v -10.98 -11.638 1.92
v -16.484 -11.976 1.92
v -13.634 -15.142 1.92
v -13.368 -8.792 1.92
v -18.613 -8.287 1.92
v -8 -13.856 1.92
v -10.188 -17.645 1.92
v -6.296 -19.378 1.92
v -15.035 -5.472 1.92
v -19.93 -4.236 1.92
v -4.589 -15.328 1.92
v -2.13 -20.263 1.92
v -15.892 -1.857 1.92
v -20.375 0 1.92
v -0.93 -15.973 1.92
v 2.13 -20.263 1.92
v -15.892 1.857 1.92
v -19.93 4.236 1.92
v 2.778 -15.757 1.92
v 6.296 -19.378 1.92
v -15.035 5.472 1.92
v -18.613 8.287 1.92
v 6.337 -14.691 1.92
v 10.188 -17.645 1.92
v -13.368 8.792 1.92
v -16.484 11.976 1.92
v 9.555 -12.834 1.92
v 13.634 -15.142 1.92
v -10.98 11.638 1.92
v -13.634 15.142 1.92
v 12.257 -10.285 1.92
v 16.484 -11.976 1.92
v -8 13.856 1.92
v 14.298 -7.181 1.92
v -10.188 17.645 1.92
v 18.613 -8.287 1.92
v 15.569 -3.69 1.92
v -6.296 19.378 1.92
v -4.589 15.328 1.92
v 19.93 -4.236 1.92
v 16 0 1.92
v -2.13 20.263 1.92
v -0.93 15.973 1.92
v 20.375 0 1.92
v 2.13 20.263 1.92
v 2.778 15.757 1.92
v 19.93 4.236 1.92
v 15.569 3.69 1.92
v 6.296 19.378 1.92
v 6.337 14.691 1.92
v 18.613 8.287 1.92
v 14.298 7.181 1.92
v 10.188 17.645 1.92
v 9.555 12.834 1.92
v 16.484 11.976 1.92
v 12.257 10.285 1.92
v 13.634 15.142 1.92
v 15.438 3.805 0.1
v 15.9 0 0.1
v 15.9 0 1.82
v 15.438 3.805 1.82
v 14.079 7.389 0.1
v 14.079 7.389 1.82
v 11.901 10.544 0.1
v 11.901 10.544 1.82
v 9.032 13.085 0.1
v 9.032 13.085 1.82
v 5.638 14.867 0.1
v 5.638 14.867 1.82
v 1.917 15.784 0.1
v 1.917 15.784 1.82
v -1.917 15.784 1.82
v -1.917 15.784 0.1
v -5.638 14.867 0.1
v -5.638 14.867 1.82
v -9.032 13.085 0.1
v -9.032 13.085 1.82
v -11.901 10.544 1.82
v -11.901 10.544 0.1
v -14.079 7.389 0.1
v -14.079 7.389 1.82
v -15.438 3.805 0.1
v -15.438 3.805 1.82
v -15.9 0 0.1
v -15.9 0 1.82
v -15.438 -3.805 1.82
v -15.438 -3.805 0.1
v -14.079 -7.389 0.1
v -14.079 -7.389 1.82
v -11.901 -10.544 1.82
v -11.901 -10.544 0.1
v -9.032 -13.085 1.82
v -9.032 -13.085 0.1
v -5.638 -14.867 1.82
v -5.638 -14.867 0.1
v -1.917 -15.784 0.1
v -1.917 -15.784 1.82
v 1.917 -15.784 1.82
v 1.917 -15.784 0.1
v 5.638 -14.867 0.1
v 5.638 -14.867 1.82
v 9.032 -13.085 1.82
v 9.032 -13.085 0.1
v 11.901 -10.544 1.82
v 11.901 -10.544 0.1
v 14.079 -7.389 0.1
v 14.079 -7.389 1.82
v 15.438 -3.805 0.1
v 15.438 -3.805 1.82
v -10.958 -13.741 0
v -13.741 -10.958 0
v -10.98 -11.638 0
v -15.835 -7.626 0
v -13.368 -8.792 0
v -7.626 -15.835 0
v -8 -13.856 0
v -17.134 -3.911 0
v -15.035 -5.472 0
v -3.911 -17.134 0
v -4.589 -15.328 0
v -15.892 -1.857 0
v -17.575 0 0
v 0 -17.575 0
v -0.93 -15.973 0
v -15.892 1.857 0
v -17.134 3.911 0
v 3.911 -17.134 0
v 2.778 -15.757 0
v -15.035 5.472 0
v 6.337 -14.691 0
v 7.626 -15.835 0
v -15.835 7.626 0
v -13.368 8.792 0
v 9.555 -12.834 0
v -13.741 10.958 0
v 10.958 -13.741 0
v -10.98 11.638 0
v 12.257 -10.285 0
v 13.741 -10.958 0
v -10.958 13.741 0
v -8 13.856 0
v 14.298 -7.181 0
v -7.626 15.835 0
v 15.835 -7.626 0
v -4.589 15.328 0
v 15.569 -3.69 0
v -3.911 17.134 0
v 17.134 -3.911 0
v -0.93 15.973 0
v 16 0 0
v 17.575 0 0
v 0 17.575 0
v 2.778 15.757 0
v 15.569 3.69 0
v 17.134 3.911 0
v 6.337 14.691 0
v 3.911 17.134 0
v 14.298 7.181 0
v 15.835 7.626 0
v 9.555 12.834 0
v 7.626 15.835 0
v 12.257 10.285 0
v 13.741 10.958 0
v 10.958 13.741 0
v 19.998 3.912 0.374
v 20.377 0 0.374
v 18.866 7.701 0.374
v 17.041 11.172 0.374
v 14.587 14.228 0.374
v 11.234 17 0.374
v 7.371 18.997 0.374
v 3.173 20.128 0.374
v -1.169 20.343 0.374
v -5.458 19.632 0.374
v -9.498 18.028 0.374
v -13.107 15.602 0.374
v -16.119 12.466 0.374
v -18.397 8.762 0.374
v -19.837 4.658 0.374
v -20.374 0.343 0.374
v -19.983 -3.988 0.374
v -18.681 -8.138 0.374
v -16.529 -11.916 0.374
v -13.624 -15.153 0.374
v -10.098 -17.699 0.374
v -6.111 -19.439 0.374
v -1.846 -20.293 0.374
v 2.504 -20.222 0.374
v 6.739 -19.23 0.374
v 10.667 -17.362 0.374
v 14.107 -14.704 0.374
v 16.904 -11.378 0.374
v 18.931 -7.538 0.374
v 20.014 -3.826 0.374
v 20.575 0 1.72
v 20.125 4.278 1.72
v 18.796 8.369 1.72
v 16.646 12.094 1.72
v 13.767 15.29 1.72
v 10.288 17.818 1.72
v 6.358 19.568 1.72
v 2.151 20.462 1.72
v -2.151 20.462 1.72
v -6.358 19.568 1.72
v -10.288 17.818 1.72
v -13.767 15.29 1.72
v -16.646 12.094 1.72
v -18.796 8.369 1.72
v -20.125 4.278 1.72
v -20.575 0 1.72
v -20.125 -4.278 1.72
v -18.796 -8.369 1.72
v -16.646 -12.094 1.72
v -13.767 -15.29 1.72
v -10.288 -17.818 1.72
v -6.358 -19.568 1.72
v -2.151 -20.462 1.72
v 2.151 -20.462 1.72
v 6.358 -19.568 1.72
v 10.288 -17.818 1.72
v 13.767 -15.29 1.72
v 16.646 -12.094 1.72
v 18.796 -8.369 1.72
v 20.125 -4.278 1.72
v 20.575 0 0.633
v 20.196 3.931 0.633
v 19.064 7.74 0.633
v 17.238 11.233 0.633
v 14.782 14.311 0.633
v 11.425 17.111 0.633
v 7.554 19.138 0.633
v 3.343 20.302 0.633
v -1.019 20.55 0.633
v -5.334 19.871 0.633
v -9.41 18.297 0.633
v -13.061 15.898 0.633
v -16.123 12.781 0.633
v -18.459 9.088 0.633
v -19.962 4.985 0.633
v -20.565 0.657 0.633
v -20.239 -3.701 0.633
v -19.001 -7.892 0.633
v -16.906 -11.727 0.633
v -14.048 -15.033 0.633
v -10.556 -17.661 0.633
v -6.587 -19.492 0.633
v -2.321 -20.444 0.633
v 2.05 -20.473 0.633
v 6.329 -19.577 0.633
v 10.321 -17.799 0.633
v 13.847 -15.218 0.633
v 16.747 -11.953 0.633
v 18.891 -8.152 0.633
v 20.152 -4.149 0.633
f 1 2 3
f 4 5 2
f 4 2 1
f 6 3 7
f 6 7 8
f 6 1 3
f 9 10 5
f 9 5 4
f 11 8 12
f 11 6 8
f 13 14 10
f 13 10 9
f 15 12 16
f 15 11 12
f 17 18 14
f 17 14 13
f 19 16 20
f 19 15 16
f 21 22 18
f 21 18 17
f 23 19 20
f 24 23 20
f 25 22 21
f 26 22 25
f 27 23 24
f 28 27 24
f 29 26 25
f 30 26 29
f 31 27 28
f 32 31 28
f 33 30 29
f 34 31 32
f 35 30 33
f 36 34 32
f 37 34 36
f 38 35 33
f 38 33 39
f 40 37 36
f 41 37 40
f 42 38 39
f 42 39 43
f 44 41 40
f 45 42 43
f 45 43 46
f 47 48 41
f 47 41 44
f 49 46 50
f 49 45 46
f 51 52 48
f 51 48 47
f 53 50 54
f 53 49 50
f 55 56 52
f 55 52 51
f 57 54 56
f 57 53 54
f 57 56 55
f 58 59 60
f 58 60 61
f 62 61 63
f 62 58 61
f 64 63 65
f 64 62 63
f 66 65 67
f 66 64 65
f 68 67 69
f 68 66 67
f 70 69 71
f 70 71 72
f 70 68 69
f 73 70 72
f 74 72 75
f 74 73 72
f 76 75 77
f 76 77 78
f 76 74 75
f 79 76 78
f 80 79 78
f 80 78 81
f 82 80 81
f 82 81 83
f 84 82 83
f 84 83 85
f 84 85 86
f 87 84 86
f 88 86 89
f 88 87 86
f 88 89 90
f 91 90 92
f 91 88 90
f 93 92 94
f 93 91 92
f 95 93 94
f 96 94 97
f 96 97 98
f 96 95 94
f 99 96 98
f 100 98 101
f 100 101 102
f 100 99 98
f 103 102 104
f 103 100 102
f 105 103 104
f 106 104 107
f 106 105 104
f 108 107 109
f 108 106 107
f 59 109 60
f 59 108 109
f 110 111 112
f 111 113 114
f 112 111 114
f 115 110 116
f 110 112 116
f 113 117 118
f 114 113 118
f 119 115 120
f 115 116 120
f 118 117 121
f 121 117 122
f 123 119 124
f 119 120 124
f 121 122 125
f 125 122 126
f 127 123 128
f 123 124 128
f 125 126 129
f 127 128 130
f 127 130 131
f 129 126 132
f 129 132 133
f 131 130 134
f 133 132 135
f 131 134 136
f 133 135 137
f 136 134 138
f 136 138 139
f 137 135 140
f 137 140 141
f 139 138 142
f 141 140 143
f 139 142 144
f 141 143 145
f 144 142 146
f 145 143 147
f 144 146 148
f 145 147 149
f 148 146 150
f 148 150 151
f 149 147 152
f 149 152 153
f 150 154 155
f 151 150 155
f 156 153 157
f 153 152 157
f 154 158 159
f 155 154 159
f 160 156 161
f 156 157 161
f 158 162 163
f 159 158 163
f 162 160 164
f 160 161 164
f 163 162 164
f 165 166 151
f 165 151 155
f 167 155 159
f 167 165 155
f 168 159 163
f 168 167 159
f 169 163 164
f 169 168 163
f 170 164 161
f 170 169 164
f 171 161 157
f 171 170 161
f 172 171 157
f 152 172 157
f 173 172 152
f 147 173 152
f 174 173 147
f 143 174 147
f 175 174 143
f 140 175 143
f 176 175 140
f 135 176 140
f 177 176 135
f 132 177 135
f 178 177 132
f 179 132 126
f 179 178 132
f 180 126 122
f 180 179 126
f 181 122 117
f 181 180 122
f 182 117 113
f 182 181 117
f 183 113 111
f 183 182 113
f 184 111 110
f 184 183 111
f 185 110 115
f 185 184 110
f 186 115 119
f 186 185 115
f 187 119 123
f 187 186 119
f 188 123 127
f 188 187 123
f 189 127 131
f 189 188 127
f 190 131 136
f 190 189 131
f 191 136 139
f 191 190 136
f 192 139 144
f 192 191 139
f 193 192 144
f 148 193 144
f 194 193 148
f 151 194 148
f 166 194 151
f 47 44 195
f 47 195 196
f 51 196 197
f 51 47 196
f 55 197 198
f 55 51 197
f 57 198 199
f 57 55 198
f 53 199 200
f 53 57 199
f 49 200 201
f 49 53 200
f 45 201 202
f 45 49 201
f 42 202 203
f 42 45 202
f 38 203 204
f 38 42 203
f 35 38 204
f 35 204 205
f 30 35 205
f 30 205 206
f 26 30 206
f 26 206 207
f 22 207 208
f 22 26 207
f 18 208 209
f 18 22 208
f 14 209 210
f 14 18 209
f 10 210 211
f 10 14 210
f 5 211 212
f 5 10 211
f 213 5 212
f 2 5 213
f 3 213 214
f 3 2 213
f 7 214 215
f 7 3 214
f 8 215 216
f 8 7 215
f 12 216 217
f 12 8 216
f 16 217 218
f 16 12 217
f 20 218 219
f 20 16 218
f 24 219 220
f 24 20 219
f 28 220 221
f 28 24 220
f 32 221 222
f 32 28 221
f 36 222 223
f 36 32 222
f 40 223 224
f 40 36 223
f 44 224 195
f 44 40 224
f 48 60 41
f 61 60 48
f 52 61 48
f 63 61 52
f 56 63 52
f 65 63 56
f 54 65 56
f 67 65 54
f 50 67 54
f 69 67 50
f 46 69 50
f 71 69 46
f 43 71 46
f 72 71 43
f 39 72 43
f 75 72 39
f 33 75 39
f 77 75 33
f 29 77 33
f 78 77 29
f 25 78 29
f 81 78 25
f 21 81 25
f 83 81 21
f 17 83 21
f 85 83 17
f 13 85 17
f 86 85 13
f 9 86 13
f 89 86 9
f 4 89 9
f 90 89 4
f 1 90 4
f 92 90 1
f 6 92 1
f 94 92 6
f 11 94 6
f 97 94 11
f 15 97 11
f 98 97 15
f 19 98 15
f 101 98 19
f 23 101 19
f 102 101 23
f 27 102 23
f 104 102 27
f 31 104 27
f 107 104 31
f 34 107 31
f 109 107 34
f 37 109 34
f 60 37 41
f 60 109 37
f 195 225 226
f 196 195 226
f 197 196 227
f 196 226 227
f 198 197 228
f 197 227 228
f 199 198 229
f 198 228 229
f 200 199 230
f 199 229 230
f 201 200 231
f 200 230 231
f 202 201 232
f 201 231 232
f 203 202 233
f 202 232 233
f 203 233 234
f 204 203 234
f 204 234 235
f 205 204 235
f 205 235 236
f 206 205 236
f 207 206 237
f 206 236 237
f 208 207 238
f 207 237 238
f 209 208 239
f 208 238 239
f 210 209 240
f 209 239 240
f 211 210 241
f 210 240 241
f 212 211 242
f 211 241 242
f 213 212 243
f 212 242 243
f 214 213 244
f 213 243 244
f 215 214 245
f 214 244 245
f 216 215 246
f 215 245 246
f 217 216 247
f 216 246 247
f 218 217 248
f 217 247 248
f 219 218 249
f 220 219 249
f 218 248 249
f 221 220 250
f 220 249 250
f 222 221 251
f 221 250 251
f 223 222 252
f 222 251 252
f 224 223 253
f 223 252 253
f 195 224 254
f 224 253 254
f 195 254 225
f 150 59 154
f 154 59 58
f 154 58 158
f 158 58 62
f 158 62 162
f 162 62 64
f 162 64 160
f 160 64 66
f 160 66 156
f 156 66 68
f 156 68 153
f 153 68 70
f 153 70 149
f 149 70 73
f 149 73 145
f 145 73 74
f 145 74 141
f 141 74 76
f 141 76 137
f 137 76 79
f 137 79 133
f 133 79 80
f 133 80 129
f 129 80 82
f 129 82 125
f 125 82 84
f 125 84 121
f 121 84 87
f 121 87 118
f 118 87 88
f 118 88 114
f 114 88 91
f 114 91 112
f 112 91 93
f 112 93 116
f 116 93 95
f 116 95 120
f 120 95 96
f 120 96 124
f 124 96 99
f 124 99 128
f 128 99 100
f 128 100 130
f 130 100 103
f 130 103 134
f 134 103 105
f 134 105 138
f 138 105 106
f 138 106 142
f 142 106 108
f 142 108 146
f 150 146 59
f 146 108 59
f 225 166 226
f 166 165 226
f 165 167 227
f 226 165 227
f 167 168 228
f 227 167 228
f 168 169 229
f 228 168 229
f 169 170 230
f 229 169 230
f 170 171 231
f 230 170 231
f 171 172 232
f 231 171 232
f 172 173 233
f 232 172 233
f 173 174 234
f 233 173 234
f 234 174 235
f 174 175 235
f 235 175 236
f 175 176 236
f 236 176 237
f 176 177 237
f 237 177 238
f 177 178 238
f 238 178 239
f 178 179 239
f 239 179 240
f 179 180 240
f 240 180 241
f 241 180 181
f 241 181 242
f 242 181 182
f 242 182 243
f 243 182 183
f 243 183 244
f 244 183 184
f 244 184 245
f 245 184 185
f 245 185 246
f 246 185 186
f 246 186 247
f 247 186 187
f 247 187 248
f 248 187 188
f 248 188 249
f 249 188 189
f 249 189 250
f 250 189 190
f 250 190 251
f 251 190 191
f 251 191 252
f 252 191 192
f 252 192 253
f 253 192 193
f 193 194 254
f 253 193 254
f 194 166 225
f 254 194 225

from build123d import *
from OCP.BRepFilletAPI import BRepFilletAPI_MakeChamfer

# Parameters (mm, degrees)
SKETCH_1_R      = 20.575
SKETCH_1_R_2    = 15.9
EXTRUDE_1_DEPTH = 1.92
CHAMFER_1_SIZE  = 3
CHAMFER_1_SIZE2 = 0.4
CHAMFER_2_SIZE  = 0.2
CHAMFER_2_SIZE2 = 0.232811476
CHAMFER_3_SIZE  = 0.1


with BuildPart() as part:
    # Эскиз1 → Бобышка-Вытянуть1 (new body)
    with BuildSketch(Plane.XY):
        Circle(SKETCH_1_R)
        Circle(SKETCH_1_R_2, mode=Mode.SUBTRACT)
    extrude(amount=EXTRUDE_1_DEPTH)

    # Фаска1
    chamfer_1_edges = [part.edges().sort_by_distance(p)[0] for p in [
        (-20.575, 0, 0),
    ]]
    chamfer_1_side = [part.faces().sort_by_distance(p)[0] for p in [
        (-19.993051119, 0, 0),
    ]]
    chamfer(chamfer_1_edges, length=CHAMFER_1_SIZE, length2=CHAMFER_1_SIZE2, reference=chamfer_1_side[0])

    # Фаска2: one chamfer whose edges measure the first distance from different faces: ONE call of the kernel's chamfer builder (chamfer() names one face for all edges)
    chamfer_2_edges_1 = [part.edges().sort_by_distance(p)[0] for p in [
        (-20.575, 0, 1.92),
    ]]
    chamfer_2_edges_2 = [part.edges().sort_by_distance(p)[0] for p in [
        (-20.575, 0, 0.4),
    ]]
    chamfer_2_side_2 = [part.faces().sort_by_distance(p)[0] for p in [
        (-19.075, 0, 0.2),
    ]]
    chamfer_2 = BRepFilletAPI_MakeChamfer(part.part.solid().wrapped)
    for e in chamfer_2_edges_1:
        chamfer_2.Add(CHAMFER_2_SIZE, e.wrapped)
    for e in chamfer_2_edges_2:
        chamfer_2.Add(CHAMFER_2_SIZE, CHAMFER_2_SIZE2, e.wrapped, chamfer_2_side_2[0].wrapped)  # the first distance lies on this face
    add(Compound.cast(chamfer_2.Shape()), mode=Mode.REPLACE)

    # Фаска3
    chamfer_3_edges = [part.edges().sort_by_distance(p)[0] for p in [
        (-15.9, 0, 0),
        (-15.9, 0, 1.92),
    ]]
    chamfer(chamfer_3_edges, length=CHAMFER_3_SIZE)


solid = part.part
